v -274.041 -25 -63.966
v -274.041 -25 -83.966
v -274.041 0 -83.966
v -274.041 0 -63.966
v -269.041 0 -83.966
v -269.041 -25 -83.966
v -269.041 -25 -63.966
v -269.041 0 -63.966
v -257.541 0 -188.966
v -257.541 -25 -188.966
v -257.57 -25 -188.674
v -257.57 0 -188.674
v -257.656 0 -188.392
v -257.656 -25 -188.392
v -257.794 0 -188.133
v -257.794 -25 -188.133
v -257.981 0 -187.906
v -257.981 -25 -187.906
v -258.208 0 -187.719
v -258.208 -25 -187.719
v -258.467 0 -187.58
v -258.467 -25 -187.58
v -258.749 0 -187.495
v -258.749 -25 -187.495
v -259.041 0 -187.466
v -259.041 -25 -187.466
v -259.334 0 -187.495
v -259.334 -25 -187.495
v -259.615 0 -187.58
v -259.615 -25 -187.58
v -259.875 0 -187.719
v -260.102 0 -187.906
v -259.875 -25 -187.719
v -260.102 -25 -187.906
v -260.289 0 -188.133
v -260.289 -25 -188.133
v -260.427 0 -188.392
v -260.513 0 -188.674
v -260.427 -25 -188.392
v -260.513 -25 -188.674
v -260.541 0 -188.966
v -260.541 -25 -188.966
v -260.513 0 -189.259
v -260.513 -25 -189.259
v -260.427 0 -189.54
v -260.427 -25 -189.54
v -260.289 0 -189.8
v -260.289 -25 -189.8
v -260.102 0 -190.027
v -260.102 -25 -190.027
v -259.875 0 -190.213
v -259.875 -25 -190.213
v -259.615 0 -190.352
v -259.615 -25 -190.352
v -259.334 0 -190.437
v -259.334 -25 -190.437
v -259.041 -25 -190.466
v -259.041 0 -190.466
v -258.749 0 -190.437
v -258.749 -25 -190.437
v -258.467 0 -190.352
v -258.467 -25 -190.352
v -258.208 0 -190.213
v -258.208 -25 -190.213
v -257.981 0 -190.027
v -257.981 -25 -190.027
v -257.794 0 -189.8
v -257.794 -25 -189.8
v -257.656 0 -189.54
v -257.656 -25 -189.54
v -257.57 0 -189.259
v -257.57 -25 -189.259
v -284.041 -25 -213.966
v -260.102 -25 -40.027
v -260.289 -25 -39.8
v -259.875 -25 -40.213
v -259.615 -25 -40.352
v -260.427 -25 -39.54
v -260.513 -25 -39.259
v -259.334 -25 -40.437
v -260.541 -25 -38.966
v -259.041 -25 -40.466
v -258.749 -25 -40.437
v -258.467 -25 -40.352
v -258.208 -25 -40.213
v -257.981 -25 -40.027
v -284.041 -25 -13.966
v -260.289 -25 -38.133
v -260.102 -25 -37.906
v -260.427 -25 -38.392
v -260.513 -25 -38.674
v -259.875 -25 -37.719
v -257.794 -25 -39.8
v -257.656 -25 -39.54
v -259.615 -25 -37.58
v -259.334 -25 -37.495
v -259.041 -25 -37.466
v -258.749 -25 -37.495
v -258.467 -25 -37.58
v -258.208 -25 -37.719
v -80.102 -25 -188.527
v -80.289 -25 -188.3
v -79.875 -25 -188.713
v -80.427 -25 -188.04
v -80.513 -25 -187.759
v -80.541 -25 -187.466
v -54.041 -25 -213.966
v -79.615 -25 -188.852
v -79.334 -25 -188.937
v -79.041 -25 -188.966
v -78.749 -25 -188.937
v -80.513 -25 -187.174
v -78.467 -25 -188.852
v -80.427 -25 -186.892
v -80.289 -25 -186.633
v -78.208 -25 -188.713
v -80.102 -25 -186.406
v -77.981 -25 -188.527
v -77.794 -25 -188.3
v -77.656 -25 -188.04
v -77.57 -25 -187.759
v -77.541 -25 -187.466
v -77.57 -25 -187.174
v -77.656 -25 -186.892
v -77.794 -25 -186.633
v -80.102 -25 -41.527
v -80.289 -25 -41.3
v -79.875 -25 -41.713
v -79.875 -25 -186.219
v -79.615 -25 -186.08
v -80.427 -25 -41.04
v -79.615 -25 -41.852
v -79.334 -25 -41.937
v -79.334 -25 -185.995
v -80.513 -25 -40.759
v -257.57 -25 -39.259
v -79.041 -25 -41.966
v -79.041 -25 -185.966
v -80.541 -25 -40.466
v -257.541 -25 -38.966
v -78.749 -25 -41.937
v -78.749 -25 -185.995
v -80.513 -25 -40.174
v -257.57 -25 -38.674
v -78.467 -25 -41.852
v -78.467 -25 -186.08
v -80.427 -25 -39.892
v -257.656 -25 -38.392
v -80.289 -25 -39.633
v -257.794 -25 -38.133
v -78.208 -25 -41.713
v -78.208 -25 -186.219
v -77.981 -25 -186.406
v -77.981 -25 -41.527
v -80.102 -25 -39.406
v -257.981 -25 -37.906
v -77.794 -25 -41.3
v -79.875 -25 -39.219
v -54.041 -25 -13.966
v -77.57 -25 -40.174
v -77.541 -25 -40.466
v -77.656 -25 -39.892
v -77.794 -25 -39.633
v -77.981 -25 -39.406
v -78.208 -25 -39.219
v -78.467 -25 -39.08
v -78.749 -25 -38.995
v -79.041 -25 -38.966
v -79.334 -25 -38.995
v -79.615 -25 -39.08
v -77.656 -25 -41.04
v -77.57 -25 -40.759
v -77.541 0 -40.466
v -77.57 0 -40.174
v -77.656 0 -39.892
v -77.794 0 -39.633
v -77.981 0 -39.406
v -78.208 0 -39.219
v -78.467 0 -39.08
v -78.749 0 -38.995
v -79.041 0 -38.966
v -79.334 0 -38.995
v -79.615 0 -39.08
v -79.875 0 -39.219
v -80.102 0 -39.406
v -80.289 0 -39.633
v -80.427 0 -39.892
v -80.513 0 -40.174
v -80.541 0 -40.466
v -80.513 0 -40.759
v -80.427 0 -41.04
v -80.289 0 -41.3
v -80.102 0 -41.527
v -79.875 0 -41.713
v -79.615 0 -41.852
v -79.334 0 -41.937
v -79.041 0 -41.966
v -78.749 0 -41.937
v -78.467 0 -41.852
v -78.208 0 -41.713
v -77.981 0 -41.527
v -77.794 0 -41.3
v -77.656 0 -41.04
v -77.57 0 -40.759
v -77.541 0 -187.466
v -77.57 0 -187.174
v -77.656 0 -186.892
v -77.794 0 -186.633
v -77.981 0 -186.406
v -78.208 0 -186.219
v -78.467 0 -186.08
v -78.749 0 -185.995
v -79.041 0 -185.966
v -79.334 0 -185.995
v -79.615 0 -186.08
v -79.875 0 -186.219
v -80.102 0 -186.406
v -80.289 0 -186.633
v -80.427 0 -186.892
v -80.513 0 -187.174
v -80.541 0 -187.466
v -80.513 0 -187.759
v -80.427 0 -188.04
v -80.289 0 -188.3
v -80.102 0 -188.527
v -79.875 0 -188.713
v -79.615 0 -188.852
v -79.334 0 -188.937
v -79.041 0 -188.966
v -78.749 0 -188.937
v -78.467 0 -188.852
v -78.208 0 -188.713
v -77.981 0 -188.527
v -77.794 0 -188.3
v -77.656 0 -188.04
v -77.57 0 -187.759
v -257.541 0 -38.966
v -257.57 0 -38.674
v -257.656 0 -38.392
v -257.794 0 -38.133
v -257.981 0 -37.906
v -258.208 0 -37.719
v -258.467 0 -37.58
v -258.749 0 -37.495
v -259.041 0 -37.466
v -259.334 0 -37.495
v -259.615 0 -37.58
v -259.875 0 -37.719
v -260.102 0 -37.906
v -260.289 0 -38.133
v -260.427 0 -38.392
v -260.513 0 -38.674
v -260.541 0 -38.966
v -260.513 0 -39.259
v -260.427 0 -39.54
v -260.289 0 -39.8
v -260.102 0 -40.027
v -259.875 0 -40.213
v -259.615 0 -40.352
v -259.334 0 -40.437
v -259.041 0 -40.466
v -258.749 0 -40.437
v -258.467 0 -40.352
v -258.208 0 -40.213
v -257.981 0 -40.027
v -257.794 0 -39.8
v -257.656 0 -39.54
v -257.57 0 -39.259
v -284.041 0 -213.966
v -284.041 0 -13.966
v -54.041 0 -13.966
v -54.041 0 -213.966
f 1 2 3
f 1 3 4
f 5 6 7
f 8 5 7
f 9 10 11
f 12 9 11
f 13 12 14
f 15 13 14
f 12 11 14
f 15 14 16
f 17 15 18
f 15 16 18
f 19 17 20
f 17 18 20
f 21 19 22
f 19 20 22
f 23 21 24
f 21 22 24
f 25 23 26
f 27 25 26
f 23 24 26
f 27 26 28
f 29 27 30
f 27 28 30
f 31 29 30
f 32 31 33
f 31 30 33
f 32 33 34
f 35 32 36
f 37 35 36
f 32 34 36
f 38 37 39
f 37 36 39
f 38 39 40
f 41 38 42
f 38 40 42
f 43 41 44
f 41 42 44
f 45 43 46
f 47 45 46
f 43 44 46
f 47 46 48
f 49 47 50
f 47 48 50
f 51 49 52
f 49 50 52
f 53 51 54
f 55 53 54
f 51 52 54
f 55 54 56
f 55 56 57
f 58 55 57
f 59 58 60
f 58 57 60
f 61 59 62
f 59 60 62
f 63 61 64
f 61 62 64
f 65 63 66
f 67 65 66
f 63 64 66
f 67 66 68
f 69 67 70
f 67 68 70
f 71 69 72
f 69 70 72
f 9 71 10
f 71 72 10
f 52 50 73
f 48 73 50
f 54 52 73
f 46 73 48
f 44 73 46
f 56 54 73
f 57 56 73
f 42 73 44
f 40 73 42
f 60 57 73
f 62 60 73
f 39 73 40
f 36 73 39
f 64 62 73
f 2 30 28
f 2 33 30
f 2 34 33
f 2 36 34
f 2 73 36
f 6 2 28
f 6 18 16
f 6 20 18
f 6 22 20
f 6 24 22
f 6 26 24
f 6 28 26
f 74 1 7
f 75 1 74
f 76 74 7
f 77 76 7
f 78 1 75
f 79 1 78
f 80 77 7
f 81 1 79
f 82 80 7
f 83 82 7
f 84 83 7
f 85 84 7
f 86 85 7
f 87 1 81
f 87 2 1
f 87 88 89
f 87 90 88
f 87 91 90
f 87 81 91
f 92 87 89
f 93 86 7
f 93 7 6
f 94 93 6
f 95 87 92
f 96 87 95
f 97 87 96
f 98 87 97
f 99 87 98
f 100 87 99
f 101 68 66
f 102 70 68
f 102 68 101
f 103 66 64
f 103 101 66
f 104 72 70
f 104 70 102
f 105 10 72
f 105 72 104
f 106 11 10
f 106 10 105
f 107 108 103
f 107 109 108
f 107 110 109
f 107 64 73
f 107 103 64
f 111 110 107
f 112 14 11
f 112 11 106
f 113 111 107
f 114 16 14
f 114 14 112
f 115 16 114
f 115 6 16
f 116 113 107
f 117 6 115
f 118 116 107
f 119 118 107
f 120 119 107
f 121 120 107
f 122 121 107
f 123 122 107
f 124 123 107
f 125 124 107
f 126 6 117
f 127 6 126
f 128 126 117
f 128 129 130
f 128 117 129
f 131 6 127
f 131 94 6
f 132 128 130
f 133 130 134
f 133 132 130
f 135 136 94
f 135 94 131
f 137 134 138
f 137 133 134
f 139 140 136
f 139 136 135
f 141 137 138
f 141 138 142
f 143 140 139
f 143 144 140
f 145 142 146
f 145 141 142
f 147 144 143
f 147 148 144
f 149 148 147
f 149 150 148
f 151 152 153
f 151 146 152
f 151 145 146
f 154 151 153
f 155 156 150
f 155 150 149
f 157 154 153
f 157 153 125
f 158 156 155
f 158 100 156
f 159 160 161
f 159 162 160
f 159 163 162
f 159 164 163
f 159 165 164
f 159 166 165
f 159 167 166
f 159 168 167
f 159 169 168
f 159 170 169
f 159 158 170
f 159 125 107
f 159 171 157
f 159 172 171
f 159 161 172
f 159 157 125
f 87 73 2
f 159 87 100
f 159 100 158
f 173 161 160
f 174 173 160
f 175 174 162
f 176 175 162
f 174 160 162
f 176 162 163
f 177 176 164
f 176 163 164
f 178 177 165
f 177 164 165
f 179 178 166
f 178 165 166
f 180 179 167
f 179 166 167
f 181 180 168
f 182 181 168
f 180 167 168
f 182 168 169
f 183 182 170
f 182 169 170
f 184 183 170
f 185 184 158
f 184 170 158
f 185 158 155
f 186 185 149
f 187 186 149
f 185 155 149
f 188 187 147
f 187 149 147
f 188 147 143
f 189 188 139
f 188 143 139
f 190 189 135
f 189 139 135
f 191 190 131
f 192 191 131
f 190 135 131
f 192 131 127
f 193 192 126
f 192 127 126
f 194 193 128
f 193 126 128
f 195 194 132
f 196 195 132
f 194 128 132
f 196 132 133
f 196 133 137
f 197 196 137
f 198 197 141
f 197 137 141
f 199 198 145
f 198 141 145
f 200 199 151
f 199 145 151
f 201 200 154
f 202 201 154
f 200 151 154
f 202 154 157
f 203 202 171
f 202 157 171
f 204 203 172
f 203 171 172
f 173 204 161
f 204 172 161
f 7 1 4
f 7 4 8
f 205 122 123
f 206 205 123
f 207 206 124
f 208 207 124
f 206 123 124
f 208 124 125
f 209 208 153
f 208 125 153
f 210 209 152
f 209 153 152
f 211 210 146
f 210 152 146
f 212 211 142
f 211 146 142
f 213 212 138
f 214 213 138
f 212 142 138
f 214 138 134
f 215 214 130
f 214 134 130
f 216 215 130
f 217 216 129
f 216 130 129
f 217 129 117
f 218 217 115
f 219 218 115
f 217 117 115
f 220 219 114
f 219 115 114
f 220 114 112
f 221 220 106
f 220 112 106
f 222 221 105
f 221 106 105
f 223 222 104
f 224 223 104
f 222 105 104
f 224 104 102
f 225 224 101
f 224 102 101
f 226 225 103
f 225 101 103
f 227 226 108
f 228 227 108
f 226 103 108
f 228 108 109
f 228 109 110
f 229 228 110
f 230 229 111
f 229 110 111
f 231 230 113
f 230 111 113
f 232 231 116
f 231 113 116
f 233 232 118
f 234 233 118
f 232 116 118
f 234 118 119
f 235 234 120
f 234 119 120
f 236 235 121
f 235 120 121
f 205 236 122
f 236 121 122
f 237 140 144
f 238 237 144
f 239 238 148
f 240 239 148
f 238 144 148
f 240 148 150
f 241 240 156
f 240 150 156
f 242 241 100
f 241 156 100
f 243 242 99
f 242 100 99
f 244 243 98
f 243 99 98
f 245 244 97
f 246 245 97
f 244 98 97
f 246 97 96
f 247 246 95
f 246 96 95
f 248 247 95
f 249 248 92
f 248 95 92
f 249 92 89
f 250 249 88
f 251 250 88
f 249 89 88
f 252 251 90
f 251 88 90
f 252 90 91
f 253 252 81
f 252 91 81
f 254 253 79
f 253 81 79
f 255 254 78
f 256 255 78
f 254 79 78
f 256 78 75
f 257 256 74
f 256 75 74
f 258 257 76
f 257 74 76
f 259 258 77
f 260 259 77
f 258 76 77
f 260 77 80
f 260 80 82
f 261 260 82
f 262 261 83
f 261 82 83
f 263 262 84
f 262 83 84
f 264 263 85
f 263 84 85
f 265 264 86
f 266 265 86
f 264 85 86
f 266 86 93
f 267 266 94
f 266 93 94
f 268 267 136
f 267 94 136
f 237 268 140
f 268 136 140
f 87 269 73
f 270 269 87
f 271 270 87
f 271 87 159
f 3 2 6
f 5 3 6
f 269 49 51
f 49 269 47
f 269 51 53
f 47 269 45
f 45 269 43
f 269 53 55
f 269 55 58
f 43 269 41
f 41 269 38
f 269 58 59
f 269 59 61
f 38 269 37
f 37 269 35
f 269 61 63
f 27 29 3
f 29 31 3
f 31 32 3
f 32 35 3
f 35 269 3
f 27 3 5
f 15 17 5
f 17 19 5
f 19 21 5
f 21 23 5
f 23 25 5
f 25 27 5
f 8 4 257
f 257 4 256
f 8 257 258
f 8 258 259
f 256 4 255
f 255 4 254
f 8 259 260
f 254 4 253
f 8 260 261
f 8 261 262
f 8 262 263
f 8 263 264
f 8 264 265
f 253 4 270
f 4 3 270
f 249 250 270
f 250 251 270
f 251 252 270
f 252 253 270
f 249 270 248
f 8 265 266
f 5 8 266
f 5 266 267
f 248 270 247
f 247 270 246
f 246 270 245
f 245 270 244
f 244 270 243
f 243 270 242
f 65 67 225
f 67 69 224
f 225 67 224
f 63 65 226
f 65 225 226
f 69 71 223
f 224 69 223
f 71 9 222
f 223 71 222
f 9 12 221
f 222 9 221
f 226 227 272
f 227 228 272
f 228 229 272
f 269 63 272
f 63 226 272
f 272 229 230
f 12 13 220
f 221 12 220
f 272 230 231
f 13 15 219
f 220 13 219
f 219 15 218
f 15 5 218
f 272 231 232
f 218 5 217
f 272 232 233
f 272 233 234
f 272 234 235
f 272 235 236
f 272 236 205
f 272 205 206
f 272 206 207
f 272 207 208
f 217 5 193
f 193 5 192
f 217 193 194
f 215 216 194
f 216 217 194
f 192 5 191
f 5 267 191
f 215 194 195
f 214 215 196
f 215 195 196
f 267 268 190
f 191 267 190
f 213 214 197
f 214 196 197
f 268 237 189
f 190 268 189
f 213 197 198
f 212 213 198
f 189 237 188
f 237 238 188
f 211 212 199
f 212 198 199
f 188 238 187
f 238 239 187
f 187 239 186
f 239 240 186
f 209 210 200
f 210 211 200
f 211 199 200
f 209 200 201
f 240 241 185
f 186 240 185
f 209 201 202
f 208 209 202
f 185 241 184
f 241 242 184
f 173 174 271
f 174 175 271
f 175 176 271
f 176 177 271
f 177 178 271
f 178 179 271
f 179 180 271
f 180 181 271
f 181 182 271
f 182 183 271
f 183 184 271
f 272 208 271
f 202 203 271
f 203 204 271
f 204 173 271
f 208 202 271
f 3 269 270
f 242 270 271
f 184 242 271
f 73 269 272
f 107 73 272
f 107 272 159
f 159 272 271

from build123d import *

# Parameters (mm, degrees)
F0_W     = 230
F0_H     = 200
F1_DEPTH = 25
F2_W     = 5
F2_H     = 20
F2_R     = 1.5
F3_DEPTH = 25
F4_DEPTH = 25


with BuildPart() as f1:
    # F0 (on Front) → F1 (new body)
    with BuildSketch(Plane.XZ):
        with Locations((-169.041439, -113.966247)):
            Rectangle(F0_W, F0_H)
    extrude(amount=F1_DEPTH)

    # F2 (on face) → F3 (cut)
    with BuildSketch(Plane.XZ.offset(25)):
        with Locations((-271.541439, -73.966247)):
            Rectangle(F2_W, F2_H)
        with Locations((-79.041439, -40.466247)):
            Circle(F2_R)
        with Locations((-79.041439, -187.466247)):
            Circle(F2_R)
        with Locations((-259.041439, -38.966247)):
            Circle(F2_R)
        with Locations((-259.041439, -188.966247)):
            Circle(F2_R)
    extrude(amount=-F3_DEPTH, mode=Mode.SUBTRACT)

    # F2 (on face) → F4 (cut)
    with BuildSketch(Plane.XZ.offset(25)):
        with Locations((-271.541439, -73.966247)):
            Rectangle(F2_W, F2_H)
        with Locations((-79.041439, -40.466247)):
            Circle(F2_R)
        with Locations((-79.041439, -187.466247)):
            Circle(F2_R)
        with Locations((-259.041439, -38.966247)):
            Circle(F2_R)
        with Locations((-259.041439, -188.966247)):
            Circle(F2_R)
    extrude(amount=-F4_DEPTH, mode=Mode.SUBTRACT)


solid = f1.part
